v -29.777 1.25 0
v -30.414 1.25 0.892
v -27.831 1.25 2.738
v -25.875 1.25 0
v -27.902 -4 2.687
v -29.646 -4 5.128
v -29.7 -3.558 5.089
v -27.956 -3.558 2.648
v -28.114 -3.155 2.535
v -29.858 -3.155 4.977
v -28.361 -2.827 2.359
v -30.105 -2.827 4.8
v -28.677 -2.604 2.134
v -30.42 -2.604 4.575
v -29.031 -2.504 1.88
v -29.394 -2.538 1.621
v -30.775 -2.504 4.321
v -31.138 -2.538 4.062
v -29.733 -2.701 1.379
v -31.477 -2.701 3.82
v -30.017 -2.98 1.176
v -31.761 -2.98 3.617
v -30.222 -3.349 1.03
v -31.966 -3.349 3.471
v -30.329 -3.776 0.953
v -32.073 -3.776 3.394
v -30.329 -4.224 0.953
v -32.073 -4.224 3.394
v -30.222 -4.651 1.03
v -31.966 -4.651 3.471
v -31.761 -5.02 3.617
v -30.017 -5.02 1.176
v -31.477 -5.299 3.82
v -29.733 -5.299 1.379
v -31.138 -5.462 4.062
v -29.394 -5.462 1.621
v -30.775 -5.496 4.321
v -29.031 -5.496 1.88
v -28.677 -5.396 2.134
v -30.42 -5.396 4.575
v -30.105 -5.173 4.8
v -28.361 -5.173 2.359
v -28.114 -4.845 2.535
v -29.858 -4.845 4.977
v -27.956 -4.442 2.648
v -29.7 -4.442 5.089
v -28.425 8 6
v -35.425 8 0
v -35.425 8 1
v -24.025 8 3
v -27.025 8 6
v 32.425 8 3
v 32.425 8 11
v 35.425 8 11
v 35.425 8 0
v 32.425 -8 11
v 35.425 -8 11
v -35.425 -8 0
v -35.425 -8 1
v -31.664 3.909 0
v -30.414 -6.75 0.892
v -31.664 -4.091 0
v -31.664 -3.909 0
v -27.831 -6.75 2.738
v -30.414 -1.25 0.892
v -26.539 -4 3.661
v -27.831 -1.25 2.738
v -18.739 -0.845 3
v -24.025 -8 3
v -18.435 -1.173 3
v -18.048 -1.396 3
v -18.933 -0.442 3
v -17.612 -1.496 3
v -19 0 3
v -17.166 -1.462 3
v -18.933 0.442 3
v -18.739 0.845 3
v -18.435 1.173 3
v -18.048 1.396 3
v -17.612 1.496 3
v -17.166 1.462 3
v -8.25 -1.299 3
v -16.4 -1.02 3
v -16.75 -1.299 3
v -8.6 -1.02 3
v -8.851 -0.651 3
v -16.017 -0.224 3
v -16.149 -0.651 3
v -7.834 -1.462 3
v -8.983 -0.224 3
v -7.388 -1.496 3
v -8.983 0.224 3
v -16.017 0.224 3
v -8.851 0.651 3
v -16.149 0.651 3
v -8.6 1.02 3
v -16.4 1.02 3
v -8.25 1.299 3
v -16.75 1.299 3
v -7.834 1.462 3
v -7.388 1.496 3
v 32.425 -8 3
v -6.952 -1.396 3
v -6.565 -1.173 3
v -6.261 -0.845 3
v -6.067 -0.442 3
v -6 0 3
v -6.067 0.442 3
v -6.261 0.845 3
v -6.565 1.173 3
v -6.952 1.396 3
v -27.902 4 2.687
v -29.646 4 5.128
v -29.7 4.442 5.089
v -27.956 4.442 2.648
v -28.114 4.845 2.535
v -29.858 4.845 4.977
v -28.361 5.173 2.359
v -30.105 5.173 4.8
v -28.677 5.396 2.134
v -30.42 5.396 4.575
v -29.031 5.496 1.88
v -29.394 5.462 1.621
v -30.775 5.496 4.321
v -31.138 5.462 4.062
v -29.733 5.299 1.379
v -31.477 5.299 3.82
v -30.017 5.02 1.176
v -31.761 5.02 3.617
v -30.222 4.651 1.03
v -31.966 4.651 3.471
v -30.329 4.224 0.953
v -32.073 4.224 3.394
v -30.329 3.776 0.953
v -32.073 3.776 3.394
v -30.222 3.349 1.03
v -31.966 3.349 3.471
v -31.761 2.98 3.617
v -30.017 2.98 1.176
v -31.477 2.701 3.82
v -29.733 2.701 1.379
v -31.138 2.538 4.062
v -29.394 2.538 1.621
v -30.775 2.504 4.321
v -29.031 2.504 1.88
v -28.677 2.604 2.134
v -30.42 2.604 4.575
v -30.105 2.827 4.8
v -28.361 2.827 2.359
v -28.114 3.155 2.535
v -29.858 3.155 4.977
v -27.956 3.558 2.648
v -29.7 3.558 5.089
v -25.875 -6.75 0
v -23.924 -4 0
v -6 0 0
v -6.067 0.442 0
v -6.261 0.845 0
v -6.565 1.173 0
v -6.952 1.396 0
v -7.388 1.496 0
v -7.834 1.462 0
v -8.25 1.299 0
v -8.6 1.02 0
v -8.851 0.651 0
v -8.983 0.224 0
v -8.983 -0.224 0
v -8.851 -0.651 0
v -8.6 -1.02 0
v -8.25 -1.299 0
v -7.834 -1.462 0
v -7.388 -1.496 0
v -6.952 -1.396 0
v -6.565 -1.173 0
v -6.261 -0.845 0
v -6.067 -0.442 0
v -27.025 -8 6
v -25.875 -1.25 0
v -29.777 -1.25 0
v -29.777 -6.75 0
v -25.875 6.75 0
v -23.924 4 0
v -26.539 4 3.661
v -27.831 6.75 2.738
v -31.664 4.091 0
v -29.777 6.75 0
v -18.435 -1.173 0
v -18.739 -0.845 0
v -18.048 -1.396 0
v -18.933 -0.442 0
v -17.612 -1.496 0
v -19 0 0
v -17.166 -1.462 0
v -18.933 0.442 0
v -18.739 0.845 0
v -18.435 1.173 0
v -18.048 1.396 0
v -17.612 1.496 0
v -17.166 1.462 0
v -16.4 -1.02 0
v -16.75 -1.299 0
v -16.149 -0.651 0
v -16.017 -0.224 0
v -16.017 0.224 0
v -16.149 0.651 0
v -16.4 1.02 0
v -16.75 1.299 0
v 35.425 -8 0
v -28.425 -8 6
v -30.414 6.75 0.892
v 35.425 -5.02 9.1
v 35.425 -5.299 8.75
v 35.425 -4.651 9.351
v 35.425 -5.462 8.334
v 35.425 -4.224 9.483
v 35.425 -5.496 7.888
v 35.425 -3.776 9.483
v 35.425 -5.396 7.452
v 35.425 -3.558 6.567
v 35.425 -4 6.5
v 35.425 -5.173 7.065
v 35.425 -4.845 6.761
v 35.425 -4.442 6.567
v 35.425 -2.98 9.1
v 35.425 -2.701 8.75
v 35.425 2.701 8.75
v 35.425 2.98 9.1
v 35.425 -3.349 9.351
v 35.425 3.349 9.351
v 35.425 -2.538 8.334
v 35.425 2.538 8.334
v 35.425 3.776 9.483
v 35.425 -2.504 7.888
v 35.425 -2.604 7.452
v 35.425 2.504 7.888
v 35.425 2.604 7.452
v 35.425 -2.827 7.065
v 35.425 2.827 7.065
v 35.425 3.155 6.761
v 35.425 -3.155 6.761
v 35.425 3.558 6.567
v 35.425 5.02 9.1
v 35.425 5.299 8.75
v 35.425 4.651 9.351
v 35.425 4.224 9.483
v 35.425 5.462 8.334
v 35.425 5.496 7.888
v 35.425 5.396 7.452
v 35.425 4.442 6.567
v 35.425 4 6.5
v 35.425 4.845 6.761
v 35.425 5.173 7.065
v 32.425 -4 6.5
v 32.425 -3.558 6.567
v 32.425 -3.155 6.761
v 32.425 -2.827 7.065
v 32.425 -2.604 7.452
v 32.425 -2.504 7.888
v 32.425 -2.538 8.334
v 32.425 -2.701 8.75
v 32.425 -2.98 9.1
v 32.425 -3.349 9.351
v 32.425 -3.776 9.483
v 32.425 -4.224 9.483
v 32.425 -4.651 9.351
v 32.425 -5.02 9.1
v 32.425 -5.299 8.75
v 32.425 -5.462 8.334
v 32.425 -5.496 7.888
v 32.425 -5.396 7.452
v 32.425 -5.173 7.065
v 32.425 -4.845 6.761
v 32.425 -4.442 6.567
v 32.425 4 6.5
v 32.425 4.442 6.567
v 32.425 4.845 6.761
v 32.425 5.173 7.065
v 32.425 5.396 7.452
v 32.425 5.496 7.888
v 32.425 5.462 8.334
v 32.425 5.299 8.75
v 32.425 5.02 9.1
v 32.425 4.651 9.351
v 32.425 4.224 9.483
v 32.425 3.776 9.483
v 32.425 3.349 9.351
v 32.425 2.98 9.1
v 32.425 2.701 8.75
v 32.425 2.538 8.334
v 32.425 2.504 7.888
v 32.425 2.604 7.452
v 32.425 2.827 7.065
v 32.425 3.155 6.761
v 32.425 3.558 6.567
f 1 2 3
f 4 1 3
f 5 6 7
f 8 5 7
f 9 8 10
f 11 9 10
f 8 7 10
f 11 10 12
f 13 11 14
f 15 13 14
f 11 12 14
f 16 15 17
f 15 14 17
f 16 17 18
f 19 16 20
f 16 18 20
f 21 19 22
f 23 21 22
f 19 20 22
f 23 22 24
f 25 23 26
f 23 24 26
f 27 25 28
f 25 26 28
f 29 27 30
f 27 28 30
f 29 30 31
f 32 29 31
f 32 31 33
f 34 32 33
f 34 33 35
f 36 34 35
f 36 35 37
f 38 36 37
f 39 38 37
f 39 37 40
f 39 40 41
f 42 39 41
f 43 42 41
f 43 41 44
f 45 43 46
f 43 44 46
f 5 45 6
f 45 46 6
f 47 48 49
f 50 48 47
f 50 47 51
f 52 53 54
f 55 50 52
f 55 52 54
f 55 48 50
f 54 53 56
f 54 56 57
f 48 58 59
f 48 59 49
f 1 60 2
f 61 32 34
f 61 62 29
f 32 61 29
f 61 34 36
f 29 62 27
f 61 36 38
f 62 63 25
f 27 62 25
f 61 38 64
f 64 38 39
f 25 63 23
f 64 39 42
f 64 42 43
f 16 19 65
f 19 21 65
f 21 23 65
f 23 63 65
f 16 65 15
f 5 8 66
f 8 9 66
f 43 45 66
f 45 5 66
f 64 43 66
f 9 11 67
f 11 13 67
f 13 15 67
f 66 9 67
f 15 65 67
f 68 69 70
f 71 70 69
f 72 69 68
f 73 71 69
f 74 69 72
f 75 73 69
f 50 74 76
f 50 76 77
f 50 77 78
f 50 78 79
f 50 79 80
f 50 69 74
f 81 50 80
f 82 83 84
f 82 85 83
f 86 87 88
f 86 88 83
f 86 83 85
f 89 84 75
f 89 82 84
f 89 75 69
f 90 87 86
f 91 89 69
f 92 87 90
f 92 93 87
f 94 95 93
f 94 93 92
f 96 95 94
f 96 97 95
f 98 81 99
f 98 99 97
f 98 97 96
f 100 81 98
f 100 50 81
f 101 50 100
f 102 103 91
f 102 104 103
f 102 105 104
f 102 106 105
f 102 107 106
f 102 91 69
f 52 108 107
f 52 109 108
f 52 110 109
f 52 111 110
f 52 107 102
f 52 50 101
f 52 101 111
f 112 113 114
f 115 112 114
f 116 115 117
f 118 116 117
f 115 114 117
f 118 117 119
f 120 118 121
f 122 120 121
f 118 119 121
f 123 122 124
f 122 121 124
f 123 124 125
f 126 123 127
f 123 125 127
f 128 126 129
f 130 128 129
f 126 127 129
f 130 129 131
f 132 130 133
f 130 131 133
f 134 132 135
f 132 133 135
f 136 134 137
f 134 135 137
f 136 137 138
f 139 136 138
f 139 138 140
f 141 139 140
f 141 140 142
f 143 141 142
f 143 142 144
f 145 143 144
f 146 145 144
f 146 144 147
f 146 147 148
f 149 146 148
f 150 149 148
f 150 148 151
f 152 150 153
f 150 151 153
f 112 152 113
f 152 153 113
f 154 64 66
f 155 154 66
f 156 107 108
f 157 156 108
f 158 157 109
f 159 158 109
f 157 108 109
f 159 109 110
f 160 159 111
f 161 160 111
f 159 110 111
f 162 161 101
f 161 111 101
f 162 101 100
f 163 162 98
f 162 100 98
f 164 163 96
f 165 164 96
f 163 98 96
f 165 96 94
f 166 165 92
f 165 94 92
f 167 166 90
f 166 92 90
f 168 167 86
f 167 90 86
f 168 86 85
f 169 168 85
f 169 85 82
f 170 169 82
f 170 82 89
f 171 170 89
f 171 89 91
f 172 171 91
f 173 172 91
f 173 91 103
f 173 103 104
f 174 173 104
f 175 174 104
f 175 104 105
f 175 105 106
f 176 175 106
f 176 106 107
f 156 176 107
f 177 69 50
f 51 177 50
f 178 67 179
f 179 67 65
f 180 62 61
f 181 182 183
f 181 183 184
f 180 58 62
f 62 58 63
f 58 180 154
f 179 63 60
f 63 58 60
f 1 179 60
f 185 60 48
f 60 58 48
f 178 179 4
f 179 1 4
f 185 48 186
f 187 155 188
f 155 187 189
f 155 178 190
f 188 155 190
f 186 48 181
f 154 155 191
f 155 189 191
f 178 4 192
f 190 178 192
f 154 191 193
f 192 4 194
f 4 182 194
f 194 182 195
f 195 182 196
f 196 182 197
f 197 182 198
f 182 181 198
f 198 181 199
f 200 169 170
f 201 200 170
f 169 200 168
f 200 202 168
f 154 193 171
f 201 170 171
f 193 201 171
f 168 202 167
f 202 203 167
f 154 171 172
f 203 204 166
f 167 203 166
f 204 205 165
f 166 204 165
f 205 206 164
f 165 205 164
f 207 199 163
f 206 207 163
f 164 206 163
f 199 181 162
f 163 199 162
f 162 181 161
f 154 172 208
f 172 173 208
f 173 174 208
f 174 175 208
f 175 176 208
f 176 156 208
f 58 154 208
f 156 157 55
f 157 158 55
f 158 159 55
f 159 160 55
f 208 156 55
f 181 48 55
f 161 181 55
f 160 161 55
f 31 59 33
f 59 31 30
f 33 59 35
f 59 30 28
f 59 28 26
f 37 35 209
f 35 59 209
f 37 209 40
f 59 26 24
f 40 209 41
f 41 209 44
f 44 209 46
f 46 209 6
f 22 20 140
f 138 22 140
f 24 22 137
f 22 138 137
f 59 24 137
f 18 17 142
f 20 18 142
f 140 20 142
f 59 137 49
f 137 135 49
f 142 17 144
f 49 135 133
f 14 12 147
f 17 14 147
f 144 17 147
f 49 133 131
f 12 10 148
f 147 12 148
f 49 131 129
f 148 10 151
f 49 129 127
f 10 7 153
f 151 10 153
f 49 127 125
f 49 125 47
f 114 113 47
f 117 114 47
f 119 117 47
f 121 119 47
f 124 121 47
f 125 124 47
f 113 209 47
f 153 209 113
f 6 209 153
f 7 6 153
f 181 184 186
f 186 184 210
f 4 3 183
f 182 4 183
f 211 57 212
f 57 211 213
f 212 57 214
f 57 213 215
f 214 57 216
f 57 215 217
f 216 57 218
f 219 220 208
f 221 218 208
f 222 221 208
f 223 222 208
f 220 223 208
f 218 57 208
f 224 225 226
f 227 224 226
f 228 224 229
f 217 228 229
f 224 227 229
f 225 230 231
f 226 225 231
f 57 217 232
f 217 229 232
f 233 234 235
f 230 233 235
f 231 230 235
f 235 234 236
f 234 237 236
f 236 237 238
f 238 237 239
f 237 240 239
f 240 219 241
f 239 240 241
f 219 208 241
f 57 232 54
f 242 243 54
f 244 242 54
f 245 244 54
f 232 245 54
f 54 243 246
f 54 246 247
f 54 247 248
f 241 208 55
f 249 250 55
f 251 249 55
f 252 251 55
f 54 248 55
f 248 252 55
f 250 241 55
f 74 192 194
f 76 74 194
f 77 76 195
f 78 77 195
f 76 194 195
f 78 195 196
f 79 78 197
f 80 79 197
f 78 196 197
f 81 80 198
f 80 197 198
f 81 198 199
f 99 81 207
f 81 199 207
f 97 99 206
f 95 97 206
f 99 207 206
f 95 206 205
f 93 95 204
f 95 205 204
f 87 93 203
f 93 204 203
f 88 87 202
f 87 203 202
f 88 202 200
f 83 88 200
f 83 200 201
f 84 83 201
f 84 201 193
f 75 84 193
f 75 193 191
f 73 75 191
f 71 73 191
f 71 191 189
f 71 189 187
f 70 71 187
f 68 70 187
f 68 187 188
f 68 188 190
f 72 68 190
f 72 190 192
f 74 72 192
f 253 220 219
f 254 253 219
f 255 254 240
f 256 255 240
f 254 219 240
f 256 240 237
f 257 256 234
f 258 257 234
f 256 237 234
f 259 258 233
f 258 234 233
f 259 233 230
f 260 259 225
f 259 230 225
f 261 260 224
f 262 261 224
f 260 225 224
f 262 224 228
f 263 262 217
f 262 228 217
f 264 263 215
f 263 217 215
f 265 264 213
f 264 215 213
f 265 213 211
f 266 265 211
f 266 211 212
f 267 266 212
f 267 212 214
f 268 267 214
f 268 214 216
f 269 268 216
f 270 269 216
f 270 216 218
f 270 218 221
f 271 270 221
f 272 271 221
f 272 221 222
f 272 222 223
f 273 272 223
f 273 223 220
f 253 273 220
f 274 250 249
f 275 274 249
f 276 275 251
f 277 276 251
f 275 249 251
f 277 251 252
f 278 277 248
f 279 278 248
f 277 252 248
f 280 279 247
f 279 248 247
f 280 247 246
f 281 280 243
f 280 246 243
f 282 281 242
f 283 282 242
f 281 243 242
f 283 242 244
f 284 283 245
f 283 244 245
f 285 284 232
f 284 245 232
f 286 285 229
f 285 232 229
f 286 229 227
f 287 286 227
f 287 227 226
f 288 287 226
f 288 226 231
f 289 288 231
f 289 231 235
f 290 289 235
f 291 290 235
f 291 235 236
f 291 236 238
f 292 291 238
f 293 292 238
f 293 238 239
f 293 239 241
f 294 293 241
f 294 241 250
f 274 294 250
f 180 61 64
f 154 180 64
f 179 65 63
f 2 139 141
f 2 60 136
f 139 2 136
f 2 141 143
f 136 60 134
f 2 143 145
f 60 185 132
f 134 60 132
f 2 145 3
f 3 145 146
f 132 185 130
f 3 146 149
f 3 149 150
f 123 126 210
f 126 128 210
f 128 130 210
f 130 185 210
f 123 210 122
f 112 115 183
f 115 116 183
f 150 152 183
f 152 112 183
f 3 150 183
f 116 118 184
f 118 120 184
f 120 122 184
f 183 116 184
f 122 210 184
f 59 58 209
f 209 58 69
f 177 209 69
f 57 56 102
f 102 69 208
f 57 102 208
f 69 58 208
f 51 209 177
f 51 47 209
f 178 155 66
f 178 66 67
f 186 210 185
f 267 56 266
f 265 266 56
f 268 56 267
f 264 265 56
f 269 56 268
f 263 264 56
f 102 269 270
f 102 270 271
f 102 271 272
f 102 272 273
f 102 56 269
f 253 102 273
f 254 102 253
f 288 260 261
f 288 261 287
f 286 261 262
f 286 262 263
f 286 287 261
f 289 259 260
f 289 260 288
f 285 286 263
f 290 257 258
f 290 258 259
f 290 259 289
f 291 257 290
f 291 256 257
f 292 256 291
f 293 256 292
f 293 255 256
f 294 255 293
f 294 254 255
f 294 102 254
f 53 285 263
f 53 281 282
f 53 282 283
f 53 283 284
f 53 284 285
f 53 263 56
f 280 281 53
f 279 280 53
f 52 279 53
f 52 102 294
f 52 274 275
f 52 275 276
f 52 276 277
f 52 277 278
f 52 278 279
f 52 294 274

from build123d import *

# Parameters (mm, degrees)
SKETCH1_W           = 70.85
SKETCH1_H           = 16
BOSS_EXTRUDE1_DEPTH = 3
SKETCH2_W           = 8.4
SKETCH2_H           = 16
BOSS_EXTRUDE2_DEPTH = 3
CHAMFER1_SIZE       = 5
CHAMFER1_SIZE2      = 7
SKETCH3_R           = 1.5
CUT_EXTRUDE1_DEPTH  = 3
CHAMFER2_SIZE       = 3
CUT_EXTRUDE2_START  = -3
CUT_EXTRUDE2_DEPTH  = 8
SKETCH5_W           = 3
SKETCH5_H           = 16
BOSS_EXTRUDE3_DEPTH = 8
SKETCH6_R           = 1.5
CUT_EXTRUDE3_DEPTH  = 8
SKETCH7_R           = 1.5
CUT_EXTRUDE4_DEPTH  = 10
SKETCH8_R           = 1.5
CUT_EXTRUDE5_DEPTH  = 10


with BuildPart() as part:
    # Sketch1 → Boss-Extrude1 (new body)
    with BuildSketch(Plane.XY):
        Rectangle(SKETCH1_W, SKETCH1_H)
    extrude(amount=BOSS_EXTRUDE1_DEPTH)

    # Sketch2 → Boss-Extrude2 (add)
    with BuildSketch(Plane.XY.offset(3)):
        with Locations((-31.225, 0)):
            Rectangle(SKETCH2_W, SKETCH2_H)
    extrude(amount=BOSS_EXTRUDE2_DEPTH)

    # Chamfer1
    chamfer1_edges = [part.edges().sort_by_distance(p)[0] for p in [
        (-35.425, 0, 6),
    ]]
    chamfer1_side = [part.faces().sort_by_distance(p)[0] for p in [
        (-35.425, 0, 3),
    ]]
    chamfer(chamfer1_edges, length=CHAMFER1_SIZE, length2=CHAMFER1_SIZE2, reference=chamfer1_side[0])

    # Sketch3 → Cut-Extrude1 (cut)
    with BuildSketch(Plane(origin=(-12.440878378, 0, 17.41722973), x_dir=(0.8137334712067354, 0, 0.5812381937190957), z_dir=(-0.5812381937190957, 0, 0.8137334712067354))):
        with Locations((-22.642944757, 4)):
            Circle(SKETCH3_R)
        with Locations((-22.642944757, -4)):
            Circle(SKETCH3_R)
    extrude(amount=-CUT_EXTRUDE1_DEPTH, mode=Mode.SUBTRACT)

    # Chamfer2
    chamfer2_edges = [part.edges().sort_by_distance(p)[0] for p in [
        (-27.025, 0, 3),
    ]]
    chamfer(chamfer2_edges, length=CHAMFER2_SIZE - 0.0001)  # a hair under: the kernel refuses the full size

    # Sketch4 → Cut-Extrude2 (cut)
    with BuildSketch(Plane(origin=(-12.440878378, 0, 17.41722973), x_dir=(0.8137334712067354, 0, 0.5812381937190959), z_dir=(-0.5812381937190958, 0, 0.8137334712067353)).offset(CUT_EXTRUDE2_START)):
        Polygon((-19.467518276, 4), (-21.055231516, 6.75), (-24.230657997, 6.75), (-25.818371237, 4), (-24.230657997, 1.25), (-21.055231516, 1.25), align=None)
        Polygon((-19.467518276, -4), (-21.055231516, -1.25), (-24.230657997, -1.25), (-25.818371237, -4), (-24.230657997, -6.75), (-21.055231516, -6.75), align=None)
    extrude(amount=-CUT_EXTRUDE2_DEPTH, mode=Mode.SUBTRACT)

    # Sketch5 → Boss-Extrude3 (add)
    with BuildSketch(Plane.XY.offset(3)):
        with Locations((33.925, 0)):
            Rectangle(SKETCH5_W, SKETCH5_H)
    extrude(amount=BOSS_EXTRUDE3_DEPTH)

    # Sketch6 → Cut-Extrude3 (cut)
    with BuildSketch(Plane(origin=(35.425, 0, 0), x_dir=(0, 0, -1), z_dir=(1, 0, 0))):
        with Locations((-8, 4)):
            Circle(SKETCH6_R)
        with Locations((-8, -4)):
            Circle(SKETCH6_R)
    extrude(amount=-CUT_EXTRUDE3_DEPTH, mode=Mode.SUBTRACT)

    # Sketch7 → Cut-Extrude4 (cut)
    with BuildSketch(Plane(origin=(0, 0, 0), x_dir=(-1, 0, 0), z_dir=(0, 0, -1))):
        with Locations((17.5, 0)):
            Circle(SKETCH7_R)
    extrude(amount=-CUT_EXTRUDE4_DEPTH, mode=Mode.SUBTRACT)

    # Sketch8 → Cut-Extrude5 (cut)
    with BuildSketch(Plane.XY.offset(3)):
        with Locations((-7.5, 0)):
            Circle(SKETCH8_R)
    extrude(amount=-CUT_EXTRUDE5_DEPTH, mode=Mode.SUBTRACT)


solid = part.part
